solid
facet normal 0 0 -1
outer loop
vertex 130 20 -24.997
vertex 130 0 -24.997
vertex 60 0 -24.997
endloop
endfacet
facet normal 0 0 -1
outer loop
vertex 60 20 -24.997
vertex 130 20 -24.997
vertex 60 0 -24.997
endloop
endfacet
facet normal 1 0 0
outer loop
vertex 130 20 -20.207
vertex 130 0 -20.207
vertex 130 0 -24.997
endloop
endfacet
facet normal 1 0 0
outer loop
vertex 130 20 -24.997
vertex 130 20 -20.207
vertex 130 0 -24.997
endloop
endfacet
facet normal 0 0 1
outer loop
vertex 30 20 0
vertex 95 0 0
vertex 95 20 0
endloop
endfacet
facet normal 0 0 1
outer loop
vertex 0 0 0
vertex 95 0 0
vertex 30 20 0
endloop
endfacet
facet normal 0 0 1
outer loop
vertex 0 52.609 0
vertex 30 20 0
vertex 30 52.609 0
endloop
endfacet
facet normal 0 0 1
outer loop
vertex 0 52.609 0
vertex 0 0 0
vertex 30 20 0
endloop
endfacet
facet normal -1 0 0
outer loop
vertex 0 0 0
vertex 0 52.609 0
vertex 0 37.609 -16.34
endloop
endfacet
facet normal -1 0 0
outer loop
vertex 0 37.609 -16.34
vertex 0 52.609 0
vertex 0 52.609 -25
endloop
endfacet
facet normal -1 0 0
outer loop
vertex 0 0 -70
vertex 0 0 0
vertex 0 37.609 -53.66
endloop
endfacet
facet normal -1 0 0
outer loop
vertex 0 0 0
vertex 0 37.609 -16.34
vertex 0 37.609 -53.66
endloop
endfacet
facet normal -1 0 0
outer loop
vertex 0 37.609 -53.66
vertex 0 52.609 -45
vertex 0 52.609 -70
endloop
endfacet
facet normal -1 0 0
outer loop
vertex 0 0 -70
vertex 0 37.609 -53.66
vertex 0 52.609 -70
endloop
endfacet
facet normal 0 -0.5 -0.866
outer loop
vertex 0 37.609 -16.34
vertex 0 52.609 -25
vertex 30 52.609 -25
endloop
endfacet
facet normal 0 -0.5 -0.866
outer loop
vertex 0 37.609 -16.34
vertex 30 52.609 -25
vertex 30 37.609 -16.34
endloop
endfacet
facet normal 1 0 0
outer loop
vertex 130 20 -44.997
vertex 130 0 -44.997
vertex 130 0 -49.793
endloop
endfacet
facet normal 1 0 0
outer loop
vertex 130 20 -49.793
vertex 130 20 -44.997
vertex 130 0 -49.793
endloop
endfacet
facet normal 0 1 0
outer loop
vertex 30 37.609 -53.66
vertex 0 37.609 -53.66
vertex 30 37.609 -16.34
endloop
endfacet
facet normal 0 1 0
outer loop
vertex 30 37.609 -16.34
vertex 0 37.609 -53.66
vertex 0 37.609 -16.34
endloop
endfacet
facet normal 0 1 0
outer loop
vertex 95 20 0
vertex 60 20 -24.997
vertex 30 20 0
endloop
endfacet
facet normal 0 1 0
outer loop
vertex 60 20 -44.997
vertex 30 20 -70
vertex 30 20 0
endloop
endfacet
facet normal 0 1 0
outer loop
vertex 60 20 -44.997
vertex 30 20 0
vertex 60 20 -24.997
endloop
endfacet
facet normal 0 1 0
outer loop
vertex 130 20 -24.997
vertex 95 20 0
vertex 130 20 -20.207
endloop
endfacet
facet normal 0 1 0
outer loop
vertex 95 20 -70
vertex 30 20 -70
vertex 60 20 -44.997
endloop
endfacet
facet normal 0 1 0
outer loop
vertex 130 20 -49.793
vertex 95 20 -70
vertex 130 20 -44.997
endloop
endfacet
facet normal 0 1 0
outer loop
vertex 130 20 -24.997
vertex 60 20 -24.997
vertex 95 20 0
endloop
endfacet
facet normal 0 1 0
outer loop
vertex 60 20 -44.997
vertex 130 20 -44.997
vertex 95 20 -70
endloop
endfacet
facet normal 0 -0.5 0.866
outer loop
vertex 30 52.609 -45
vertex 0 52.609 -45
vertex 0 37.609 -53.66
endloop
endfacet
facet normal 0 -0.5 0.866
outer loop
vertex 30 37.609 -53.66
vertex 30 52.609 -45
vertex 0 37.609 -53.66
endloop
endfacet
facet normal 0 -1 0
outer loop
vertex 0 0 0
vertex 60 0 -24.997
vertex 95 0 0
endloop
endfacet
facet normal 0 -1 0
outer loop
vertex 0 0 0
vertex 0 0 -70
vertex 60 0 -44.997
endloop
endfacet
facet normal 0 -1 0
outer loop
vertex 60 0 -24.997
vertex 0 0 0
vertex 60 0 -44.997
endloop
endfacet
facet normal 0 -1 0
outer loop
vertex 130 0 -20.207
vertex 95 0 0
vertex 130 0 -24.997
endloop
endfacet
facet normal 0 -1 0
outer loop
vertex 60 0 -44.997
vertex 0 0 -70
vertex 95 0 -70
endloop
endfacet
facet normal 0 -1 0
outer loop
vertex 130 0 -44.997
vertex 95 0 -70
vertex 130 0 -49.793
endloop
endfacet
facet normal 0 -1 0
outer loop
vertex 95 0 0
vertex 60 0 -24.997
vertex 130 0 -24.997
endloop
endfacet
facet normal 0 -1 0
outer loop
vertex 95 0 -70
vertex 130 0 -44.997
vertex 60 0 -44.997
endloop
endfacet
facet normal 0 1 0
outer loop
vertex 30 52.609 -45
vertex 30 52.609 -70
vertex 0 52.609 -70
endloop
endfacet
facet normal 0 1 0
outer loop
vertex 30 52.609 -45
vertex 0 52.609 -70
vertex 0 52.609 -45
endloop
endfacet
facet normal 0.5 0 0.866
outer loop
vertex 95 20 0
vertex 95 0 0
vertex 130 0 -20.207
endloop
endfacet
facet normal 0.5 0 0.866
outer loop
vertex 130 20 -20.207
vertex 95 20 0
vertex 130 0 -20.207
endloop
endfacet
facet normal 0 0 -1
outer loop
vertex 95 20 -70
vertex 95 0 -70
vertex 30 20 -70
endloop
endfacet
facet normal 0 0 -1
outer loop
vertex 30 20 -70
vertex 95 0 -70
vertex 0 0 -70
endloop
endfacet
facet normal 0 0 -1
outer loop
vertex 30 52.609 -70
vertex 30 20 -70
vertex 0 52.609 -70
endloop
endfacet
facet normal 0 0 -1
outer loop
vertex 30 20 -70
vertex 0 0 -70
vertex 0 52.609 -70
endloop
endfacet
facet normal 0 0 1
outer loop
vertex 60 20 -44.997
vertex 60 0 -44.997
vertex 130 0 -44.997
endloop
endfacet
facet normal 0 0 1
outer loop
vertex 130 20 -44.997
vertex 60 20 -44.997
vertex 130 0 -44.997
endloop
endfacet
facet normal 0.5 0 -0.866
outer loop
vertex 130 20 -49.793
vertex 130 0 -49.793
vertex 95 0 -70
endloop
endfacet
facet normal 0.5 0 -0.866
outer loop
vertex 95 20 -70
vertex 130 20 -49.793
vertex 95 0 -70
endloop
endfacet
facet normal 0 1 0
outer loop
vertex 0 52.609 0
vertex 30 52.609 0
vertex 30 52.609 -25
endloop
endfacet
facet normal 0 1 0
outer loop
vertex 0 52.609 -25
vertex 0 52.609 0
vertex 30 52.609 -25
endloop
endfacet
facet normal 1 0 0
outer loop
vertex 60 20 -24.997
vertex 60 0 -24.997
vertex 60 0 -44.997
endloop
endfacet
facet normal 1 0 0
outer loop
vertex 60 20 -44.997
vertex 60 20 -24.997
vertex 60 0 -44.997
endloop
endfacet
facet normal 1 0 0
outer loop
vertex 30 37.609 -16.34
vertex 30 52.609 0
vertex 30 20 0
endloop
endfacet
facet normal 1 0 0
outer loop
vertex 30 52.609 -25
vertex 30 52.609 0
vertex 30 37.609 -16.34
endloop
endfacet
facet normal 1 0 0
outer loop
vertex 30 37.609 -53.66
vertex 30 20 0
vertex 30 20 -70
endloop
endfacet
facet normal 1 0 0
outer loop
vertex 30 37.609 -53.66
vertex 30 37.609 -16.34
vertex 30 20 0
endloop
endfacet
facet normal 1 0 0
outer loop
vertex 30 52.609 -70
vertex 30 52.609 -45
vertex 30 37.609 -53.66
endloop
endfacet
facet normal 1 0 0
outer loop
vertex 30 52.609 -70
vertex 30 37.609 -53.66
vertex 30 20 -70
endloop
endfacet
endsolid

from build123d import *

# Parameters (mm, degrees)
SALIENTE_EXTRUIR4_DEPTH = 20
SALIENTE_EXTRUIR5_DEPTH = 30


with BuildPart() as part:
    # Croquis2 → Saliente-Extruir4 (new body)
    with BuildSketch(Plane(origin=(0, 0, 0), x_dir=(1, 0, 0), z_dir=(0, 1, 0))):
        Polygon((130, 20.207259422), (130, 24.997259422), (60, 24.997259422), (60, 44.997259422), (130, 44.997259422), (130, 49.792740578), (95, 70), (0, 70), (0, 0), (95, 0), align=None)
    extrude(amount=SALIENTE_EXTRUIR4_DEPTH)

    # Croquis4 → Saliente-Extruir5 (add)
    with BuildSketch(Plane.ZY):
        Polygon((0, 20), (0, 52.609160269), (-25, 52.609160269), (-16.339745962, 37.609160269), (-35, 37.609160269), (-35, 20), align=None)
    saliente_extruir5 = extrude(amount=-SALIENTE_EXTRUIR5_DEPTH)

    # Simetría1: Saliente-Extruir5 across plane
    add(saliente_extruir5.mirror(Plane(origin=(0, 0, -35), x_dir=(1, 0, 0), z_dir=(0, 0, -1))))


solid = part.part
